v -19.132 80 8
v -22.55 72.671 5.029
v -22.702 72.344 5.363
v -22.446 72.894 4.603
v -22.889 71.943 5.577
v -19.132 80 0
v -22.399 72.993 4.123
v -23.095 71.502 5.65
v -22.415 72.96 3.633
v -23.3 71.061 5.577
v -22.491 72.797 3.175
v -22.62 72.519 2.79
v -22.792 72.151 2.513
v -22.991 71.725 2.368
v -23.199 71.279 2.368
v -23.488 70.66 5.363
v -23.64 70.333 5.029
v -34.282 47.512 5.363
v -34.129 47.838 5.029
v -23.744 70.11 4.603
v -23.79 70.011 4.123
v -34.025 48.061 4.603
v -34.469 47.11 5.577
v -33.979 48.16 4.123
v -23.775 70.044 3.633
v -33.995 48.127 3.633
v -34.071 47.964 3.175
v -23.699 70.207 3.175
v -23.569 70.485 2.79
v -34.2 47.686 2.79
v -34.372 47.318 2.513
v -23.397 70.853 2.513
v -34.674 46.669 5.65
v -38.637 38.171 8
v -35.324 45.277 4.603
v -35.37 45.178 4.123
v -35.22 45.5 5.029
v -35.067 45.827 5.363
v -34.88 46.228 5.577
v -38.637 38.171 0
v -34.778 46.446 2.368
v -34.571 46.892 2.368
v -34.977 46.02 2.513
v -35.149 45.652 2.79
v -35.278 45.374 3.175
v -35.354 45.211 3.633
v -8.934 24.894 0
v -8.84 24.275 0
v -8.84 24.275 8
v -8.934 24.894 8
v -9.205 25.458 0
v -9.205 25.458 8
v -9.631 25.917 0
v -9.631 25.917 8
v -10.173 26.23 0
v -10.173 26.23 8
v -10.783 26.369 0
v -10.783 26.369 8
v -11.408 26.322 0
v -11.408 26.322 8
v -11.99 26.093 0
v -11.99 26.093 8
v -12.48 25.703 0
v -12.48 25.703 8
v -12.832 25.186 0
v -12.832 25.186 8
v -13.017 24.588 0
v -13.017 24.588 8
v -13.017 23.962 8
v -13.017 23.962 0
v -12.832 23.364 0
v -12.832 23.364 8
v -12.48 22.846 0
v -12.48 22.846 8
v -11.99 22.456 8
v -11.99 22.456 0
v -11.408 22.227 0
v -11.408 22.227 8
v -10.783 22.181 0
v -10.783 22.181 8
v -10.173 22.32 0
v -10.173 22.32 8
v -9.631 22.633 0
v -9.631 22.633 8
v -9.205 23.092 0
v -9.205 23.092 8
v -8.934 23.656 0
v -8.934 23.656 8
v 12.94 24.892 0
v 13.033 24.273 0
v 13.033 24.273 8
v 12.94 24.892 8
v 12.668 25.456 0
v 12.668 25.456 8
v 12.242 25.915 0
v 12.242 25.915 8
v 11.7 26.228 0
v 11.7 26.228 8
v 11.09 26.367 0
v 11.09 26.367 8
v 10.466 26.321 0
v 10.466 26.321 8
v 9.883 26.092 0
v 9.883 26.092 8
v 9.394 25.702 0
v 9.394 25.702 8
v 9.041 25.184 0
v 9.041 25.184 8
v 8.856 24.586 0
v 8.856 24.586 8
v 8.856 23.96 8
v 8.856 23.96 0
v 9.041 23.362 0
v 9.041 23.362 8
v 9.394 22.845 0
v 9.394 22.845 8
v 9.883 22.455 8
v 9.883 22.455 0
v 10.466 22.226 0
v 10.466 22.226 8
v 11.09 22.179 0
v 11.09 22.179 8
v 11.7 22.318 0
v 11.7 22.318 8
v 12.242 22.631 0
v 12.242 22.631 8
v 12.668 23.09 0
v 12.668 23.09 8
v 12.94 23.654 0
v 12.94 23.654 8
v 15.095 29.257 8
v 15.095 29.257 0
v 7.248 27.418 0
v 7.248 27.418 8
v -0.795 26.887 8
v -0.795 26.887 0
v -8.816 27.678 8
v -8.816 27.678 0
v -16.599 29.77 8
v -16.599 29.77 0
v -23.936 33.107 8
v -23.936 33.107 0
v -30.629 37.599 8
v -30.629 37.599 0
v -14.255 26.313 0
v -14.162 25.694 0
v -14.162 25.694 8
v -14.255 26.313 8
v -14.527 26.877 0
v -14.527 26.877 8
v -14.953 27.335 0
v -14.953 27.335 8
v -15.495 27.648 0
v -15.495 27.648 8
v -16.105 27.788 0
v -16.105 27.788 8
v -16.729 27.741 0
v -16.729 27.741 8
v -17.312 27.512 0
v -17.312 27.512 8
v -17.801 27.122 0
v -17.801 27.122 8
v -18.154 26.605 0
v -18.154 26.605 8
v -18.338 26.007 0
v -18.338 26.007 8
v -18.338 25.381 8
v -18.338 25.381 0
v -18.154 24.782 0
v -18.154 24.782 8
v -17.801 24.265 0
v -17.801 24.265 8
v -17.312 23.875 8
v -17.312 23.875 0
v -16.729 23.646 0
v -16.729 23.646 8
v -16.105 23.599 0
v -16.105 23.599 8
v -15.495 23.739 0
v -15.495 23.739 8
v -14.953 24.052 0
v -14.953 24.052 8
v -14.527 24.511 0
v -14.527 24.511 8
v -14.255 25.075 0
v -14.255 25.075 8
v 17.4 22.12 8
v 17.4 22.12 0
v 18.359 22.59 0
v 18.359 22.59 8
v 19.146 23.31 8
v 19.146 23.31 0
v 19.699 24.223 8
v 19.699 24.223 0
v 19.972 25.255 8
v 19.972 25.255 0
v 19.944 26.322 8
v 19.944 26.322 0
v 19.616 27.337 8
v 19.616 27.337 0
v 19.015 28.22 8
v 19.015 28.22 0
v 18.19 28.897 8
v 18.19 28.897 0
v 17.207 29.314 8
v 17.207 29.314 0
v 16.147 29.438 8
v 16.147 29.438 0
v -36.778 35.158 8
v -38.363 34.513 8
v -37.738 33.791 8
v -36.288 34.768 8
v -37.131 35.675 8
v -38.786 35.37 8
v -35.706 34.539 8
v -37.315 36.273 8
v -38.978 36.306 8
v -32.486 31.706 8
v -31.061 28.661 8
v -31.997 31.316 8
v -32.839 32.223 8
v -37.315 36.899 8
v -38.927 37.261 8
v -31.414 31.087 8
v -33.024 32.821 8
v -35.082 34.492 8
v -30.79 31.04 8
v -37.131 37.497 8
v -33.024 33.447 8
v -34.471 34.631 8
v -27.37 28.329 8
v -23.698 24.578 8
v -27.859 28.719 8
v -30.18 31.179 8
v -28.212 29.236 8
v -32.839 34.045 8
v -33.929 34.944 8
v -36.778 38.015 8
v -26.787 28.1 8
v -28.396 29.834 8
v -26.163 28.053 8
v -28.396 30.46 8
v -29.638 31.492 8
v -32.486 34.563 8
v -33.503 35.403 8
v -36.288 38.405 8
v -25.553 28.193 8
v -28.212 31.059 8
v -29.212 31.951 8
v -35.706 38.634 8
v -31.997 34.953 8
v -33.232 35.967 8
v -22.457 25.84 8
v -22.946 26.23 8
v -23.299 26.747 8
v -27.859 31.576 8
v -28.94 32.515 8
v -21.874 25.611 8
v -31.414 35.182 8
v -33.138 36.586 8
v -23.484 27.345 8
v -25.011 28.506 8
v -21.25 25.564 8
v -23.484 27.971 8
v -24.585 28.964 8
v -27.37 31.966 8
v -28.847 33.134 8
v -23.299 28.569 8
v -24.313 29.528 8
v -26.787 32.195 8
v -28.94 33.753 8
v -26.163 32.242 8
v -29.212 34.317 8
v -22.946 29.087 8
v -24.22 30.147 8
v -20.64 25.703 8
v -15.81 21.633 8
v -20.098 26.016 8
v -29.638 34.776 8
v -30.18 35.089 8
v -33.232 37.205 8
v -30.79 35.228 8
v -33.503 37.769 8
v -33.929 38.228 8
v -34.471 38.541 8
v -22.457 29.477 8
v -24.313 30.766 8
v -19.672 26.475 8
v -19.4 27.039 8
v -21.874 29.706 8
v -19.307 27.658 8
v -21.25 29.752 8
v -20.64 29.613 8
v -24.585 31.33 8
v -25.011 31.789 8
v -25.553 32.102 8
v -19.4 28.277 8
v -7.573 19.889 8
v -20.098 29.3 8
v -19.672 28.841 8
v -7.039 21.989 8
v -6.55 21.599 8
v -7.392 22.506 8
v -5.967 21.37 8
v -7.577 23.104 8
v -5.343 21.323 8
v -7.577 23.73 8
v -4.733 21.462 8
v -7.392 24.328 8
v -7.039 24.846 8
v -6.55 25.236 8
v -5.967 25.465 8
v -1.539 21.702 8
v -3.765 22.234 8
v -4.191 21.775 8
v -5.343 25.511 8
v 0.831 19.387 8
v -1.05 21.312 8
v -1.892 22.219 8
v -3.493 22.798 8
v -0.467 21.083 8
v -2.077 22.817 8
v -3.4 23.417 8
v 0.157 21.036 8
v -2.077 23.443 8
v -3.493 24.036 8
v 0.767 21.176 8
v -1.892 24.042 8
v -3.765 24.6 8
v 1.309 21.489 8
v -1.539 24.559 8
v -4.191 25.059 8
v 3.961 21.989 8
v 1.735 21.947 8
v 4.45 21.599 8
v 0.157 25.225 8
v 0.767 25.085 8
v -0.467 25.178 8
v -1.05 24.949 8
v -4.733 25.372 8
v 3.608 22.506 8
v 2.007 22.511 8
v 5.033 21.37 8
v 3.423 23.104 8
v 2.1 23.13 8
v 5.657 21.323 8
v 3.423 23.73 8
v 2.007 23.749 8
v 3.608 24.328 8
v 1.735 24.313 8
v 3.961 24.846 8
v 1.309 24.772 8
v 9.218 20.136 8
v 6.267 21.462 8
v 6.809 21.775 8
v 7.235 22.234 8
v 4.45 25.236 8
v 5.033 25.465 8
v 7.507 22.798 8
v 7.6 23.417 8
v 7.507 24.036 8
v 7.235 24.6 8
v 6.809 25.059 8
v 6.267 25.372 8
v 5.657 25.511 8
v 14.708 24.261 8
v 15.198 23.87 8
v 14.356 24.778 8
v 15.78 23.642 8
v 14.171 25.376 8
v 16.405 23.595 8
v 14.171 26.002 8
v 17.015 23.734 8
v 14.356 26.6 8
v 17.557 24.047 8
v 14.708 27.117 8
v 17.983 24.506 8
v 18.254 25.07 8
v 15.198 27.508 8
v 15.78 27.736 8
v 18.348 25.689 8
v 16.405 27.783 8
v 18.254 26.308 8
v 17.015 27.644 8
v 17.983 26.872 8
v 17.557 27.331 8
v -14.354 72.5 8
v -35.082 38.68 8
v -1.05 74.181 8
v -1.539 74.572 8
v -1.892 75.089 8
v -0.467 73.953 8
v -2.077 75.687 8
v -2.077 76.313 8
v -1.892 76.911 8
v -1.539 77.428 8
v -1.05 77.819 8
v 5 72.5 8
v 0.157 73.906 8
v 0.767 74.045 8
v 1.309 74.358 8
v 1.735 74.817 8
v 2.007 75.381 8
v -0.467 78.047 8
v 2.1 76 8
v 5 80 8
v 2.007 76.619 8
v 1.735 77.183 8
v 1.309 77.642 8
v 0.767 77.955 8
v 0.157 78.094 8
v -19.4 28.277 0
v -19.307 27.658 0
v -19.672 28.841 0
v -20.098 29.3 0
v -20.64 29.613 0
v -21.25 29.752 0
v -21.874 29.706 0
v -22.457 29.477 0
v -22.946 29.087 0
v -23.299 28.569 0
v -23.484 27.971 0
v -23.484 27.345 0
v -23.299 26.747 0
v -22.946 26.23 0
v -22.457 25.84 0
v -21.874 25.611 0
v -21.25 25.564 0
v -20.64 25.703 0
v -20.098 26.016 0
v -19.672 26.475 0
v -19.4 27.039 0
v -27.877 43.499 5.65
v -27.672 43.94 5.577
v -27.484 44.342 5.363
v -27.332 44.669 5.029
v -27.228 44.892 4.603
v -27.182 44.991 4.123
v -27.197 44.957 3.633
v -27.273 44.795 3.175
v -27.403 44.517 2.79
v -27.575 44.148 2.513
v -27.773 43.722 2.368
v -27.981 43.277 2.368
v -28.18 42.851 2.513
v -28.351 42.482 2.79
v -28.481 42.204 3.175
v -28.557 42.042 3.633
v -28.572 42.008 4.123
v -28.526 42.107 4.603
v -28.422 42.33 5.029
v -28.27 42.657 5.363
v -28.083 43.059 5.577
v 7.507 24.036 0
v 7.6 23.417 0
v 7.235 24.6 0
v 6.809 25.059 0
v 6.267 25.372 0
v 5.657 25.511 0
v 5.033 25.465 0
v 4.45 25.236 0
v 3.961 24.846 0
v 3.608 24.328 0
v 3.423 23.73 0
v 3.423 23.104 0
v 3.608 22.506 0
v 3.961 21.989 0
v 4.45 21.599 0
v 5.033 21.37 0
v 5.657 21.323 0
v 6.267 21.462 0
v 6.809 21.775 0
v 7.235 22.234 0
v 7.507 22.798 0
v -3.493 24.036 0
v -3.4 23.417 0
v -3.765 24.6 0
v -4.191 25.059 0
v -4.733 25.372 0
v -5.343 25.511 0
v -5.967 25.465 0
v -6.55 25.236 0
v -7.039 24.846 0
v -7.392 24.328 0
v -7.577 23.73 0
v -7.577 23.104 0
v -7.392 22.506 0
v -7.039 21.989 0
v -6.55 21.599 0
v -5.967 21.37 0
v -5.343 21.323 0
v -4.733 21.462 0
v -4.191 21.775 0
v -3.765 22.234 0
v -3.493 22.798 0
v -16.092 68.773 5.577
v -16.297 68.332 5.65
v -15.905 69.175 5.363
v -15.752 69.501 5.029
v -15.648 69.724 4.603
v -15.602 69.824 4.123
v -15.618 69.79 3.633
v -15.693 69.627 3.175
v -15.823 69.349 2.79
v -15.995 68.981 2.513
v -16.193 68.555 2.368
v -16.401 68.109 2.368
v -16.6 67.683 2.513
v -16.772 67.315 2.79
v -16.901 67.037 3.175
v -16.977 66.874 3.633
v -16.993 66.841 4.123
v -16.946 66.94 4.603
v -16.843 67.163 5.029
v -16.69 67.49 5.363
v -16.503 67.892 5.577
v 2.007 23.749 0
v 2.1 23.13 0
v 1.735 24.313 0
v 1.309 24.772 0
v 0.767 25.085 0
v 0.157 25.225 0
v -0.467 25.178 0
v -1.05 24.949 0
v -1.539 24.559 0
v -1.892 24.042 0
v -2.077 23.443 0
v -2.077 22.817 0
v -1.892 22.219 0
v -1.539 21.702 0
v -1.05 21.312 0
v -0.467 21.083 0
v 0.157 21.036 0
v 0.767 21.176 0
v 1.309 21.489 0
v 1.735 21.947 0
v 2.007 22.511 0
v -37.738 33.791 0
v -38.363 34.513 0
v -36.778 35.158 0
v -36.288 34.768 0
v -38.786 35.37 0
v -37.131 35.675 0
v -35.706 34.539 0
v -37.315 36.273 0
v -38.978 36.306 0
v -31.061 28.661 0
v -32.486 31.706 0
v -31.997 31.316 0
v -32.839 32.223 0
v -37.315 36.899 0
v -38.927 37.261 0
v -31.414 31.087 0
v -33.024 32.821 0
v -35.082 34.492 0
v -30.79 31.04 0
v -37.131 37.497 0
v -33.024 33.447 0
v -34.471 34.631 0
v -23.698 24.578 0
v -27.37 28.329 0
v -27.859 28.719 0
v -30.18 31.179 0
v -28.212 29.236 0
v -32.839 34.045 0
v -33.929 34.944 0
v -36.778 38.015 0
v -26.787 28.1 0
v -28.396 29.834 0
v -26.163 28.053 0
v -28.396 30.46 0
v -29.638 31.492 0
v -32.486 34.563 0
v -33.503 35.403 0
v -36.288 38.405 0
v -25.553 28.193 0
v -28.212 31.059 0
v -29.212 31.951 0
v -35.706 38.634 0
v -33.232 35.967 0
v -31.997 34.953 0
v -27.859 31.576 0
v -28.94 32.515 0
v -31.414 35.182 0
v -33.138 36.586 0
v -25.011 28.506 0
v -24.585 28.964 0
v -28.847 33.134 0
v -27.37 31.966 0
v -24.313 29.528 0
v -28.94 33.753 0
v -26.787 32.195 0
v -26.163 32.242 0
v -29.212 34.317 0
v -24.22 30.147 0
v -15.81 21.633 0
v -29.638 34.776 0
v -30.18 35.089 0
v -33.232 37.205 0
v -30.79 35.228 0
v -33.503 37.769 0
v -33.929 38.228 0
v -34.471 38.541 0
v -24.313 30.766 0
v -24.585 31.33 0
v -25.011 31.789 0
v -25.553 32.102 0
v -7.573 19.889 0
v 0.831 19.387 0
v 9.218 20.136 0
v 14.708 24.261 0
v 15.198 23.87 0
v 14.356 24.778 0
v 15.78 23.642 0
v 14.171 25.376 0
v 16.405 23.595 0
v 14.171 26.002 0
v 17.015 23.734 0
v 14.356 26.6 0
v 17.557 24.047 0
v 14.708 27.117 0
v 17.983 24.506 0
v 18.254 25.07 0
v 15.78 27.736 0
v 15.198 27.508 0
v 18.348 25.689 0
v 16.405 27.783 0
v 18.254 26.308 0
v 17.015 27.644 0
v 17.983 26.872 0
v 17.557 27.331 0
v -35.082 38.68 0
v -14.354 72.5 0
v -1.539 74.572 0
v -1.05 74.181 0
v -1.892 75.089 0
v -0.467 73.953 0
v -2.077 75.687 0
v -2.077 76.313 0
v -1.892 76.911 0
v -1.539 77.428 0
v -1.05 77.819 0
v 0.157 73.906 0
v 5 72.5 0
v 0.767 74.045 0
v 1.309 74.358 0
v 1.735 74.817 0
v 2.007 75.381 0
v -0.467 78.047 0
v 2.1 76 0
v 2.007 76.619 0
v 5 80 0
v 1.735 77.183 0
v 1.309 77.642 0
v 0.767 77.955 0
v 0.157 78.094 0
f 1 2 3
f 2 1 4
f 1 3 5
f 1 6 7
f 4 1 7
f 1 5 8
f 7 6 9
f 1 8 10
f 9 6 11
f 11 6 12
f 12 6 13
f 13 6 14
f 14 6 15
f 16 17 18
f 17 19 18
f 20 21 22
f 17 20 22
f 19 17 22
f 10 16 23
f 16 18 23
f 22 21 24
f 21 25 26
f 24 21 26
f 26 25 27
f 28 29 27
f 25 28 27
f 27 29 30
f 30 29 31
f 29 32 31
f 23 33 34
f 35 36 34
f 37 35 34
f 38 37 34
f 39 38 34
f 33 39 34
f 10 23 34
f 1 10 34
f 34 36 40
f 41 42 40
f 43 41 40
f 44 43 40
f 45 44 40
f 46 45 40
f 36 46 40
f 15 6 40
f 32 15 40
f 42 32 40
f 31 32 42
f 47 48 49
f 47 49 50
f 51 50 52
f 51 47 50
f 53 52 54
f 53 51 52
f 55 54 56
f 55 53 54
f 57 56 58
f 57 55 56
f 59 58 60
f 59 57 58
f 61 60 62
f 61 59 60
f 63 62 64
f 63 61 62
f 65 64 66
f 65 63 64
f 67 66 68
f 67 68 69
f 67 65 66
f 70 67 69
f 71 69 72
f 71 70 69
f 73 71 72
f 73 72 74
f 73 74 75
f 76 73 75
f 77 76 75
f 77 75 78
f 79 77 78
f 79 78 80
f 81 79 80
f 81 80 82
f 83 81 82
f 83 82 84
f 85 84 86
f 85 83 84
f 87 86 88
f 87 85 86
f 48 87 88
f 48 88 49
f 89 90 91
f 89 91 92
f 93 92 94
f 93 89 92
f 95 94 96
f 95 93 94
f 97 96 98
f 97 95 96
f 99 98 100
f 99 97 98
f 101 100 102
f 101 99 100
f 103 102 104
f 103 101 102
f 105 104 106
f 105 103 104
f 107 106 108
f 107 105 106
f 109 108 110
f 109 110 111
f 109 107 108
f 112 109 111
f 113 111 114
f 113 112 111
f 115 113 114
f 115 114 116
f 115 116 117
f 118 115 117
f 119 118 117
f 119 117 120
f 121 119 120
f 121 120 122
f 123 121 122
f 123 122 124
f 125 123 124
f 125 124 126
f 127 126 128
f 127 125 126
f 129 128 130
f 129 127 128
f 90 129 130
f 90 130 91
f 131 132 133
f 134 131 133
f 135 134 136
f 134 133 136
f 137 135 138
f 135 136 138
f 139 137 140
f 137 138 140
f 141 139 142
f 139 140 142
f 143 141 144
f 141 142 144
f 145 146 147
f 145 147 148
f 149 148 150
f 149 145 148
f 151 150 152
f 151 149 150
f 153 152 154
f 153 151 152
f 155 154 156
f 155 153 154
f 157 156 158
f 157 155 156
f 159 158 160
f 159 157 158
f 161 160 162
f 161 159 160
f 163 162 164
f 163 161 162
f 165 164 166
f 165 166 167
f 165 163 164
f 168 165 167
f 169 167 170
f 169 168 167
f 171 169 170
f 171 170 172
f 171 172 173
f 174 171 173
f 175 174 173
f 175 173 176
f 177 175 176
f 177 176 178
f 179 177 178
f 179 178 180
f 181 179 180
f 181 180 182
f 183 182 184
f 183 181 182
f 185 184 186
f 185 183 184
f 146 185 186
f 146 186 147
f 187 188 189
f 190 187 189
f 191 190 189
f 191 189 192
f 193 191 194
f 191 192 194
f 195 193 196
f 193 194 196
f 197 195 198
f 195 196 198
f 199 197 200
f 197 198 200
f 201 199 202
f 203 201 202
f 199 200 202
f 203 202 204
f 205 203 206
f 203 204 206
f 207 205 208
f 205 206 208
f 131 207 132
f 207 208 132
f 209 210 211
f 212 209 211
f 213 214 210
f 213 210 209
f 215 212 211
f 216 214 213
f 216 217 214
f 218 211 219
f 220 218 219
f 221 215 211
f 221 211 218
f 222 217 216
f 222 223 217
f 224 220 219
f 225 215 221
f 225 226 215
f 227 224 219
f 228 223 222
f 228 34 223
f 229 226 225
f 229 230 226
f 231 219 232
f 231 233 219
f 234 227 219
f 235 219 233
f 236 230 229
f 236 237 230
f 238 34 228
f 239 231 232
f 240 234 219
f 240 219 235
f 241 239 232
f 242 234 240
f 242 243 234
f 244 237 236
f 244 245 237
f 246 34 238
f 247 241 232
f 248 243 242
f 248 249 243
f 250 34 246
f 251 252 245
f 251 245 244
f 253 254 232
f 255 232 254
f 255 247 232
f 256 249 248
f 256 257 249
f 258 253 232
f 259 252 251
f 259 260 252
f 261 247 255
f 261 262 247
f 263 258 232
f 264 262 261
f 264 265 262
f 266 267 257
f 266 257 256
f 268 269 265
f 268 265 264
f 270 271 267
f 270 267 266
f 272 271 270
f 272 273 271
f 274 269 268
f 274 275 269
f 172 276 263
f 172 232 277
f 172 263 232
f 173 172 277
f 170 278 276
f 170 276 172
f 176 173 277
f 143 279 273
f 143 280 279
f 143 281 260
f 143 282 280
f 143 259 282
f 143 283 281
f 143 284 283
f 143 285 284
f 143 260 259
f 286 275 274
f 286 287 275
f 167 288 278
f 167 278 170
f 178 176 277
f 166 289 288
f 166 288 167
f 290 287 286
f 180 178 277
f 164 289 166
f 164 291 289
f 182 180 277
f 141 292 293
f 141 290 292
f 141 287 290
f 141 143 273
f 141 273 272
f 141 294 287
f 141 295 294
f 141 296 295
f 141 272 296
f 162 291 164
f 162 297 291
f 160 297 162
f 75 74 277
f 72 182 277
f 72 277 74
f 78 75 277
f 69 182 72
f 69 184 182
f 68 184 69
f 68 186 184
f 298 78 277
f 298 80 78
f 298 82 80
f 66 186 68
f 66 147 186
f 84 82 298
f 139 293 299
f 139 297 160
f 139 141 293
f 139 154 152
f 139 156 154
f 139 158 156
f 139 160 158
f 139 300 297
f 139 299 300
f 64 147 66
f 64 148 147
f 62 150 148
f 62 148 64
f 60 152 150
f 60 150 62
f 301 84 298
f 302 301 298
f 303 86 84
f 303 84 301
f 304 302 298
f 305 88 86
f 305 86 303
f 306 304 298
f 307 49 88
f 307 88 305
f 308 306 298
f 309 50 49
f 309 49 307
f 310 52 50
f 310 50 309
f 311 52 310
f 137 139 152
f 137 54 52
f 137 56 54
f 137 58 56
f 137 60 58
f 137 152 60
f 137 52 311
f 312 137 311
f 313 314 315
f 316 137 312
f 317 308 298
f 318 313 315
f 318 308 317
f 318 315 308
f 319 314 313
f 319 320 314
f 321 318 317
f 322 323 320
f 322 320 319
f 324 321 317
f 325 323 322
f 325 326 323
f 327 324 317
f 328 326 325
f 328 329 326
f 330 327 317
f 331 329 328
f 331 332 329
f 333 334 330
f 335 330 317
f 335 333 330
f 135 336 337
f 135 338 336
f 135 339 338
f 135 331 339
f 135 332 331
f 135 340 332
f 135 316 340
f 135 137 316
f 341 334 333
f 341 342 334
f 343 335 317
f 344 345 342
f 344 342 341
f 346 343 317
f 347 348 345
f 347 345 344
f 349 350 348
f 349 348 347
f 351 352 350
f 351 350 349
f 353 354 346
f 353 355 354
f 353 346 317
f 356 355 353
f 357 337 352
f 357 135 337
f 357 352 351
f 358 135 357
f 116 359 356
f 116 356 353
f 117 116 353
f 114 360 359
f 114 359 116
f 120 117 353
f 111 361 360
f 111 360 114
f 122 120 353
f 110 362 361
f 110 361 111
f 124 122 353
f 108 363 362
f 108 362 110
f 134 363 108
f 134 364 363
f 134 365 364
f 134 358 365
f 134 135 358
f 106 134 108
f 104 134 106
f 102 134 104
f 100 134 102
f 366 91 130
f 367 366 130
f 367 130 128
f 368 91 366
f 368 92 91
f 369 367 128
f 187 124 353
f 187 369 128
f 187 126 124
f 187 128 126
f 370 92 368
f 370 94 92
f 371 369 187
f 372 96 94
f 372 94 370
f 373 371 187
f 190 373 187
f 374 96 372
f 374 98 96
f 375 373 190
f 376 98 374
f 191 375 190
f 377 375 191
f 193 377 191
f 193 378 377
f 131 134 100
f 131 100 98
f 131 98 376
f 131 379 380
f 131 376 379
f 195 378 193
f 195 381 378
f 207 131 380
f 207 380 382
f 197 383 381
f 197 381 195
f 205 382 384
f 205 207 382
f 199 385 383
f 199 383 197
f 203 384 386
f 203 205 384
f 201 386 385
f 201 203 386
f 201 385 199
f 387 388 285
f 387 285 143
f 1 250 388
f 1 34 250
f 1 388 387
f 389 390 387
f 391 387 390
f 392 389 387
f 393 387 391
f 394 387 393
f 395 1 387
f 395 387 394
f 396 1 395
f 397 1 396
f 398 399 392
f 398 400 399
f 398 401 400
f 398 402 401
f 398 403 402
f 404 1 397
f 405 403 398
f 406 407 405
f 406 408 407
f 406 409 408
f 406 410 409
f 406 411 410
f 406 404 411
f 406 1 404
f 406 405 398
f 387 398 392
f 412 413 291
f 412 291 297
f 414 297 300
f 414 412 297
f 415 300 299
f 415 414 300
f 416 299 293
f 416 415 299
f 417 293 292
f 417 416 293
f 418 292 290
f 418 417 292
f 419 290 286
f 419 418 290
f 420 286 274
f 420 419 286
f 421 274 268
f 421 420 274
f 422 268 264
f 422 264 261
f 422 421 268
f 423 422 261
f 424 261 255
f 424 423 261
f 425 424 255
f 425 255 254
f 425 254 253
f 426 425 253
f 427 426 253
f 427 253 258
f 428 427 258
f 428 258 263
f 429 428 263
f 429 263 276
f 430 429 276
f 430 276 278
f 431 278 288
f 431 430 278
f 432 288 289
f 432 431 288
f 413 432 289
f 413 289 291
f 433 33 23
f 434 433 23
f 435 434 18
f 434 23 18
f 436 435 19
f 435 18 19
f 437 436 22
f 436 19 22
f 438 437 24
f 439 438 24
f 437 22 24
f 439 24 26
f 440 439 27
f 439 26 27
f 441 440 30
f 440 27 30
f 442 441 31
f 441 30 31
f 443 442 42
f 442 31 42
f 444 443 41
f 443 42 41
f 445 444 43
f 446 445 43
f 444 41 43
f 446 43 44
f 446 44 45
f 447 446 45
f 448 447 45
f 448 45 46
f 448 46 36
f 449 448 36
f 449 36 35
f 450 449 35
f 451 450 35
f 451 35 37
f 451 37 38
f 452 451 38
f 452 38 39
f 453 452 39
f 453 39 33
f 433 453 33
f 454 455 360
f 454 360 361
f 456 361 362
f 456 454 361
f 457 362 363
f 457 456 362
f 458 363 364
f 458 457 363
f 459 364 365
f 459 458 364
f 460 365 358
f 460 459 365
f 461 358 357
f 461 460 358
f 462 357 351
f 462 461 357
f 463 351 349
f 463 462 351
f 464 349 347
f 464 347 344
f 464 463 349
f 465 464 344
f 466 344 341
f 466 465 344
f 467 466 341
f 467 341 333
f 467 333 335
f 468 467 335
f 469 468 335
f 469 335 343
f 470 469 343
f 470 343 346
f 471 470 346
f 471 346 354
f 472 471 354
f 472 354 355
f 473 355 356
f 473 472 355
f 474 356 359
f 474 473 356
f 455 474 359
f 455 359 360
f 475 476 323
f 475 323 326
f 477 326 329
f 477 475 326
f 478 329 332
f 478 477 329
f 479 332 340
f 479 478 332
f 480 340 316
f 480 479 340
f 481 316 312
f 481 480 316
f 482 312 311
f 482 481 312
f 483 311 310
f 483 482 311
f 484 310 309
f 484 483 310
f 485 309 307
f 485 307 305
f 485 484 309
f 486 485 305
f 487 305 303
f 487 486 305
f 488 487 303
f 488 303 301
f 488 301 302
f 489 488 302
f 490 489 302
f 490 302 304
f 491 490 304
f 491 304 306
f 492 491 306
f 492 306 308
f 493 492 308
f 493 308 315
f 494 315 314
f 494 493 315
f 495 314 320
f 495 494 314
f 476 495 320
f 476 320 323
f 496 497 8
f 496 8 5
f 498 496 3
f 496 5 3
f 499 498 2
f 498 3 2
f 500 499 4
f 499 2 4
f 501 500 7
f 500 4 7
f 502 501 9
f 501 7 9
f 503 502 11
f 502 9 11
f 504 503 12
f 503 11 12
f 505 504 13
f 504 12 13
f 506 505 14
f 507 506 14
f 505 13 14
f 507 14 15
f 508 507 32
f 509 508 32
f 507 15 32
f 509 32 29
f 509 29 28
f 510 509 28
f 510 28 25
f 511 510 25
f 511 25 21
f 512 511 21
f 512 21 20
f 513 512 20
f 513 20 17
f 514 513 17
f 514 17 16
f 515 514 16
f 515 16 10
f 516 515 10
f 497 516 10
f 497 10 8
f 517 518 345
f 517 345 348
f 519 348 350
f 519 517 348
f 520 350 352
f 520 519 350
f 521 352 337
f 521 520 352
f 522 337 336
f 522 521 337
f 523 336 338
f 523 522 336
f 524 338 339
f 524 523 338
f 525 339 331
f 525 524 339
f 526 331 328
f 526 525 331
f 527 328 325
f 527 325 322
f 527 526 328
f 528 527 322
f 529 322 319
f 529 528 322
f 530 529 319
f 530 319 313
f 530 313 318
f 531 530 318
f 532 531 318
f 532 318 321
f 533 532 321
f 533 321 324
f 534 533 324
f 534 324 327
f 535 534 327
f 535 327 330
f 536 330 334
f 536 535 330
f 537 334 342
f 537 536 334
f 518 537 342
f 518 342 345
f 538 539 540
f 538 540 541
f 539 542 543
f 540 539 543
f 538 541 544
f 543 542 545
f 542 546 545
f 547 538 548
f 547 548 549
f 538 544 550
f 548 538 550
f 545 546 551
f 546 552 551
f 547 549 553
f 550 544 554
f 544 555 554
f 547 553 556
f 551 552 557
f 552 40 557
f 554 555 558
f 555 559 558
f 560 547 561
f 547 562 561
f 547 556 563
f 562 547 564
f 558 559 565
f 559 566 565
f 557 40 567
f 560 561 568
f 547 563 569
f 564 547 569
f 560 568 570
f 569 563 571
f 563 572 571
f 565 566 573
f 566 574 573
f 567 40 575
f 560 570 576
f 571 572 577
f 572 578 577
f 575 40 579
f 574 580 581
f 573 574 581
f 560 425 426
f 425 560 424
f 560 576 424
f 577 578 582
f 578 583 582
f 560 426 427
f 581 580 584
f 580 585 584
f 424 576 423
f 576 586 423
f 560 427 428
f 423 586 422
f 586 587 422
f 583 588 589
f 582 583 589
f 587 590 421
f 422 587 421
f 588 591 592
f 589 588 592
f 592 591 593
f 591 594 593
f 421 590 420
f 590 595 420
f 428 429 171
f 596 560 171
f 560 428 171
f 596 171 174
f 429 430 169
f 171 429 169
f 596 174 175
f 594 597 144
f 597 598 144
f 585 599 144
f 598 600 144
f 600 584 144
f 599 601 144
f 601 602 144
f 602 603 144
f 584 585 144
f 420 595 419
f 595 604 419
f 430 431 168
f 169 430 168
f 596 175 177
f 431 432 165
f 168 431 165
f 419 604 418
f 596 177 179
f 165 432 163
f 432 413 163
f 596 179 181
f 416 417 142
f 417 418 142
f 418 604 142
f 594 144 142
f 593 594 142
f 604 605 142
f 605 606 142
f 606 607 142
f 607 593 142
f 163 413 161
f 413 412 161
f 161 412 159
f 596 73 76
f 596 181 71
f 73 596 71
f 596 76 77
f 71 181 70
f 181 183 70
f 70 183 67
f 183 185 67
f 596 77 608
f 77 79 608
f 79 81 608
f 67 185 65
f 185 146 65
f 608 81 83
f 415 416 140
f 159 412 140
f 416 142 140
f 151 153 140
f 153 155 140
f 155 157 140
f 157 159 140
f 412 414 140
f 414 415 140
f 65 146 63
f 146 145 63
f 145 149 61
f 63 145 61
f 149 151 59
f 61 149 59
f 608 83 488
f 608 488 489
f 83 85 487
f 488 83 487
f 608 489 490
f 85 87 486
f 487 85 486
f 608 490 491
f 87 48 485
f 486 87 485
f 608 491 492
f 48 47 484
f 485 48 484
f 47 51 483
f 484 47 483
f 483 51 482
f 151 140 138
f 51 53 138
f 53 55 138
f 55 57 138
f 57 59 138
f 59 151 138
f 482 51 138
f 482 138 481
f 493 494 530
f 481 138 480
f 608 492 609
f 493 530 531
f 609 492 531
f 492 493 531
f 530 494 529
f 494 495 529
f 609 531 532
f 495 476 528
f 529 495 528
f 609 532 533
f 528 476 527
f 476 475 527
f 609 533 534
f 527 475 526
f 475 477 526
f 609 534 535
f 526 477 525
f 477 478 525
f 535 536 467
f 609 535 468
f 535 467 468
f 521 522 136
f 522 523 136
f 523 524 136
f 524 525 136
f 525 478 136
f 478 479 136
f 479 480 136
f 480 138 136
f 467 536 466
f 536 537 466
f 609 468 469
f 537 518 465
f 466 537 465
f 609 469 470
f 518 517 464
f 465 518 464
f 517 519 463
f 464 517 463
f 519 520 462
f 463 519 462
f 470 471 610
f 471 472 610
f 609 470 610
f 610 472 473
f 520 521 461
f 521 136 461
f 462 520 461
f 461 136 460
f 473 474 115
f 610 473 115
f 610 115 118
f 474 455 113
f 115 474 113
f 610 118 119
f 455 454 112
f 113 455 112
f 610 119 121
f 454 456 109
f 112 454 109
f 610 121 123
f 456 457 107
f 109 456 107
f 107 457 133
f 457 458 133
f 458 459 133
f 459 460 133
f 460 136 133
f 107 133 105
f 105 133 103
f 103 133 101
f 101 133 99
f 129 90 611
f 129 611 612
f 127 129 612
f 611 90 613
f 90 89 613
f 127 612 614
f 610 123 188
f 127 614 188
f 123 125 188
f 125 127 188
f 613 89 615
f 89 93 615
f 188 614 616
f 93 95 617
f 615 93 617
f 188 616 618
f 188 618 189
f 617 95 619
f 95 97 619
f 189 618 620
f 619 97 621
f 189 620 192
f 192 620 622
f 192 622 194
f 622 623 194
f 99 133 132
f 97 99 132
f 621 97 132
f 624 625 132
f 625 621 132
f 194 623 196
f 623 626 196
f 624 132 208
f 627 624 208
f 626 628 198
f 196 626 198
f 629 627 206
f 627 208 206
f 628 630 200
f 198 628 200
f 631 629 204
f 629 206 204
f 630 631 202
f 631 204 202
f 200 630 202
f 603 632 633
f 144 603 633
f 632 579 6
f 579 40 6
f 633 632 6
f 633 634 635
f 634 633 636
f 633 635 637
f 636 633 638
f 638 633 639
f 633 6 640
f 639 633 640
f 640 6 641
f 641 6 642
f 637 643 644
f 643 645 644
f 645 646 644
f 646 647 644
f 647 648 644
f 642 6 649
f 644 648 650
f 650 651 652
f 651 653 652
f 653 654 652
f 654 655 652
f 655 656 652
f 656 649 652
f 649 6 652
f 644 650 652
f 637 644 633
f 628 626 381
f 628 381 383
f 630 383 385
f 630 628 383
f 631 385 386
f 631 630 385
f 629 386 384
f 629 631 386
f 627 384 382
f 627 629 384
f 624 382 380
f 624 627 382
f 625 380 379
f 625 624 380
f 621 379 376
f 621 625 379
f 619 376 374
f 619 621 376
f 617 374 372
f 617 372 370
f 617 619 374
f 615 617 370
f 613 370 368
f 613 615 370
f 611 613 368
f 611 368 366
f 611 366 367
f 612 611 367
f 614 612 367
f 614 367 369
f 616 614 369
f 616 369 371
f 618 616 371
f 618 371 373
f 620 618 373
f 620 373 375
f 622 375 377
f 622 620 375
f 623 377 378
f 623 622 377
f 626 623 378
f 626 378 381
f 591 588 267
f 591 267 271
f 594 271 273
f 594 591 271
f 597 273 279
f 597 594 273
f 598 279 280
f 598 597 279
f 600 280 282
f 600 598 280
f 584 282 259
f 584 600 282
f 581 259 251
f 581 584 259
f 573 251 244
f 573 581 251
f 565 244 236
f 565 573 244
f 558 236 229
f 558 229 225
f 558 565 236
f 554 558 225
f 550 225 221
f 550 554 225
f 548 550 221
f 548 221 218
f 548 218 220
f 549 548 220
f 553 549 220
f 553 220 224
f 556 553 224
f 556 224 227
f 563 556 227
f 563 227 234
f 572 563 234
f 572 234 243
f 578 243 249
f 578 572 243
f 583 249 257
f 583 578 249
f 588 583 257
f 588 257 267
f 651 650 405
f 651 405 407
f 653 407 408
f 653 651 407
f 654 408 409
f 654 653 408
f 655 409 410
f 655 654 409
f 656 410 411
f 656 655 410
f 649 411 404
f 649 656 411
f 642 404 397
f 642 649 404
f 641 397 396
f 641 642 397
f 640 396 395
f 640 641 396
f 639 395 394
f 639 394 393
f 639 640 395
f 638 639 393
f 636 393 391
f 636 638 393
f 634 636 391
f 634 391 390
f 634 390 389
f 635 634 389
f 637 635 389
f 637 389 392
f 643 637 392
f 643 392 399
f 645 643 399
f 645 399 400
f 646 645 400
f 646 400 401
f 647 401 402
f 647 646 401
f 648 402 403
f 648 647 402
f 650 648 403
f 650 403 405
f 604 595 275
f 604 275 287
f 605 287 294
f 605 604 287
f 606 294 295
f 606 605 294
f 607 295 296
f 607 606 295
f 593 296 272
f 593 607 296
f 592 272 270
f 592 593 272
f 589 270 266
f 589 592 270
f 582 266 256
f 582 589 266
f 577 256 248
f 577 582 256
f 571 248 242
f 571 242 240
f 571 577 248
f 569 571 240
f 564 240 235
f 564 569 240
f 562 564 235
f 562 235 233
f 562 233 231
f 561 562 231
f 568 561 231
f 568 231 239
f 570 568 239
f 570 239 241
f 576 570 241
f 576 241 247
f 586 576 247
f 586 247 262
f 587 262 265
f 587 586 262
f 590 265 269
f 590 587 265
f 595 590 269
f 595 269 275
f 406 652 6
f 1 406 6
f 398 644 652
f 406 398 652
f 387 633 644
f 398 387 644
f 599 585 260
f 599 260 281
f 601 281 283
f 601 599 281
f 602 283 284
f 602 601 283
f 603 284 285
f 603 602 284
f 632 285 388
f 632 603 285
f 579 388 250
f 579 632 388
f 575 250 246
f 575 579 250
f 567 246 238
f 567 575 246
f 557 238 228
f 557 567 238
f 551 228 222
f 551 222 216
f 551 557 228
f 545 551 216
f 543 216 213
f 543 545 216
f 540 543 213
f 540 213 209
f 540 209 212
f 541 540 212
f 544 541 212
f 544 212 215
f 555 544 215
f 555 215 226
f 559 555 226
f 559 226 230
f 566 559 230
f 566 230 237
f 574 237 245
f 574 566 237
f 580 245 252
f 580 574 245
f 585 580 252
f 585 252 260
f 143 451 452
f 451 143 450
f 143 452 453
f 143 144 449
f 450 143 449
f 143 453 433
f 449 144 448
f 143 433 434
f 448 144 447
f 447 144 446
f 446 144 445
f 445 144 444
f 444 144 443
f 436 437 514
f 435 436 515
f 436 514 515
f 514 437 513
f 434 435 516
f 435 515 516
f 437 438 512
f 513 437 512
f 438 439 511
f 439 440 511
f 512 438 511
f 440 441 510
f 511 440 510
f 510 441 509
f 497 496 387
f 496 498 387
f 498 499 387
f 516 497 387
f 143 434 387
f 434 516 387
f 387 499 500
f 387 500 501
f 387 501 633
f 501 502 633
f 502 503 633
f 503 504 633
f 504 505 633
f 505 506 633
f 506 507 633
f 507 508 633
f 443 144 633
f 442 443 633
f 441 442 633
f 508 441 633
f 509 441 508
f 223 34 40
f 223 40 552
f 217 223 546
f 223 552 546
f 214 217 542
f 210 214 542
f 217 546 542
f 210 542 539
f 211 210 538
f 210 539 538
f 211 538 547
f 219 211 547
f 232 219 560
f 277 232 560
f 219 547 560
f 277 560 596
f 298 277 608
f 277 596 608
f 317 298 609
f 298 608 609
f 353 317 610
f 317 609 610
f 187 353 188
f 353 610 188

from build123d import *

# Parameters (mm, degrees)
SKETCH1_R           = 2.1
BOSS_EXTRUDE1_DEPTH = 8
CUT_EXTRUDE1_REACH  = 63.082
SKETCH2_R           = 1.65


with BuildPart() as part:
    # Sketch1 → Boss-Extrude1 (new body)
    with BuildSketch(Plane.XY):
        with BuildLine():
            Line((-14.353967242, 72.5), (5, 72.5))
            Line((5, 72.5), (5, 80))
            Line((5, 80), (-19.131994198, 80))
            Line((-19.131994198, 80), (-38.637128513, 38.171104477))
            ThreePointArc((-38.637128513, 38.171104477), (-38.911873787, 35.832206145), (-37.737913805, 33.790699757))
            ThreePointArc((-37.737913805, 33.790699757), (-11.724148086, 20.607586106), (17.400101197, 22.120396774))
            ThreePointArc((17.400101197, 22.120396774), (19.816194151, 26.841360112), (15.095230814, 29.257453067))
            ThreePointArc((15.095230814, 29.257453067), (-8.815701312, 27.678006068), (-30.628506806, 37.599137276))
            Line((-30.628506806, 37.599137276), (-14.353967242, 72.5))
        make_face()
        with Locations((0, 76)):
            Circle(SKETCH1_R, mode=Mode.SUBTRACT)
        with Locations((-30.947084331, 33.134292287)):
            Circle(SKETCH1_R, mode=Mode.SUBTRACT)
        with Locations((-35.238474323, 36.58628597)):
            Circle(SKETCH1_R, mode=Mode.SUBTRACT)
        with Locations((16.247666005, 25.68892492)):
            Circle(SKETCH1_R, mode=Mode.SUBTRACT)
        with Locations((10.932992292, 24.273211913)):
            Circle(SKETCH1_R, mode=Mode.SUBTRACT)
        with Locations((5.5, 23.417294418)):
            Circle(SKETCH1_R, mode=Mode.SUBTRACT)
        with Locations((-26.319869018, 30.147460036)):
            Circle(SKETCH1_R, mode=Mode.SUBTRACT)
        with Locations((-16.261912507, 25.693527972)):
            Circle(SKETCH1_R, mode=Mode.SUBTRACT)
        with Locations((-10.940316211, 24.274760441)):
            Circle(SKETCH1_R, mode=Mode.SUBTRACT)
        with Locations((-21.407041065, 27.658201118)):
            Circle(SKETCH1_R, mode=Mode.SUBTRACT)
        with Locations((-5.5, 23.417294418)):
            Circle(SKETCH1_R, mode=Mode.SUBTRACT)
        with Locations((0, 23.130434783)):
            Circle(SKETCH1_R, mode=Mode.SUBTRACT)
    extrude(amount=BOSS_EXTRUDE1_DEPTH)

    # Sketch2 → Cut-Extrude1 (cut, up to next)
    with BuildSketch(Plane(origin=(-46.356679233, 21.616474533, 0), x_dir=(0, 0, 1), z_dir=(-0.906307787, 0.422618262, 0)), mode=Mode.PRIVATE) as cut_extrude1_sk1:
        with Locations((4, 55.04255297)):
            Circle(SKETCH2_R)
    cut_extrude1_tool1 = extrude(cut_extrude1_sk1.sketch, amount=-CUT_EXTRUDE1_REACH, mode=Mode.PRIVATE) & part.part
    add(cut_extrude1_tool1.solids().sort_by_distance((-23.094691, 71.501969, 4))[0], mode=Mode.SUBTRACT)
    # Sketch2 → Cut-Extrude1 (cut, up to next)
    with BuildSketch(Plane(origin=(-46.356679233, 21.616474533, 0), x_dir=(0, 0, 1), z_dir=(-0.906307787, 0.422618262, 0)), mode=Mode.PRIVATE) as cut_extrude1_sk2:
        with Locations((4, 27.64255297)):
            Circle(SKETCH2_R)
    cut_extrude1_tool2 = extrude(cut_extrude1_sk2.sketch, amount=-CUT_EXTRUDE1_REACH, mode=Mode.PRIVATE) & part.part
    add(cut_extrude1_tool2.solids().sort_by_distance((-34.674432, 46.669136, 4))[0], mode=Mode.SUBTRACT)


solid = part.part
